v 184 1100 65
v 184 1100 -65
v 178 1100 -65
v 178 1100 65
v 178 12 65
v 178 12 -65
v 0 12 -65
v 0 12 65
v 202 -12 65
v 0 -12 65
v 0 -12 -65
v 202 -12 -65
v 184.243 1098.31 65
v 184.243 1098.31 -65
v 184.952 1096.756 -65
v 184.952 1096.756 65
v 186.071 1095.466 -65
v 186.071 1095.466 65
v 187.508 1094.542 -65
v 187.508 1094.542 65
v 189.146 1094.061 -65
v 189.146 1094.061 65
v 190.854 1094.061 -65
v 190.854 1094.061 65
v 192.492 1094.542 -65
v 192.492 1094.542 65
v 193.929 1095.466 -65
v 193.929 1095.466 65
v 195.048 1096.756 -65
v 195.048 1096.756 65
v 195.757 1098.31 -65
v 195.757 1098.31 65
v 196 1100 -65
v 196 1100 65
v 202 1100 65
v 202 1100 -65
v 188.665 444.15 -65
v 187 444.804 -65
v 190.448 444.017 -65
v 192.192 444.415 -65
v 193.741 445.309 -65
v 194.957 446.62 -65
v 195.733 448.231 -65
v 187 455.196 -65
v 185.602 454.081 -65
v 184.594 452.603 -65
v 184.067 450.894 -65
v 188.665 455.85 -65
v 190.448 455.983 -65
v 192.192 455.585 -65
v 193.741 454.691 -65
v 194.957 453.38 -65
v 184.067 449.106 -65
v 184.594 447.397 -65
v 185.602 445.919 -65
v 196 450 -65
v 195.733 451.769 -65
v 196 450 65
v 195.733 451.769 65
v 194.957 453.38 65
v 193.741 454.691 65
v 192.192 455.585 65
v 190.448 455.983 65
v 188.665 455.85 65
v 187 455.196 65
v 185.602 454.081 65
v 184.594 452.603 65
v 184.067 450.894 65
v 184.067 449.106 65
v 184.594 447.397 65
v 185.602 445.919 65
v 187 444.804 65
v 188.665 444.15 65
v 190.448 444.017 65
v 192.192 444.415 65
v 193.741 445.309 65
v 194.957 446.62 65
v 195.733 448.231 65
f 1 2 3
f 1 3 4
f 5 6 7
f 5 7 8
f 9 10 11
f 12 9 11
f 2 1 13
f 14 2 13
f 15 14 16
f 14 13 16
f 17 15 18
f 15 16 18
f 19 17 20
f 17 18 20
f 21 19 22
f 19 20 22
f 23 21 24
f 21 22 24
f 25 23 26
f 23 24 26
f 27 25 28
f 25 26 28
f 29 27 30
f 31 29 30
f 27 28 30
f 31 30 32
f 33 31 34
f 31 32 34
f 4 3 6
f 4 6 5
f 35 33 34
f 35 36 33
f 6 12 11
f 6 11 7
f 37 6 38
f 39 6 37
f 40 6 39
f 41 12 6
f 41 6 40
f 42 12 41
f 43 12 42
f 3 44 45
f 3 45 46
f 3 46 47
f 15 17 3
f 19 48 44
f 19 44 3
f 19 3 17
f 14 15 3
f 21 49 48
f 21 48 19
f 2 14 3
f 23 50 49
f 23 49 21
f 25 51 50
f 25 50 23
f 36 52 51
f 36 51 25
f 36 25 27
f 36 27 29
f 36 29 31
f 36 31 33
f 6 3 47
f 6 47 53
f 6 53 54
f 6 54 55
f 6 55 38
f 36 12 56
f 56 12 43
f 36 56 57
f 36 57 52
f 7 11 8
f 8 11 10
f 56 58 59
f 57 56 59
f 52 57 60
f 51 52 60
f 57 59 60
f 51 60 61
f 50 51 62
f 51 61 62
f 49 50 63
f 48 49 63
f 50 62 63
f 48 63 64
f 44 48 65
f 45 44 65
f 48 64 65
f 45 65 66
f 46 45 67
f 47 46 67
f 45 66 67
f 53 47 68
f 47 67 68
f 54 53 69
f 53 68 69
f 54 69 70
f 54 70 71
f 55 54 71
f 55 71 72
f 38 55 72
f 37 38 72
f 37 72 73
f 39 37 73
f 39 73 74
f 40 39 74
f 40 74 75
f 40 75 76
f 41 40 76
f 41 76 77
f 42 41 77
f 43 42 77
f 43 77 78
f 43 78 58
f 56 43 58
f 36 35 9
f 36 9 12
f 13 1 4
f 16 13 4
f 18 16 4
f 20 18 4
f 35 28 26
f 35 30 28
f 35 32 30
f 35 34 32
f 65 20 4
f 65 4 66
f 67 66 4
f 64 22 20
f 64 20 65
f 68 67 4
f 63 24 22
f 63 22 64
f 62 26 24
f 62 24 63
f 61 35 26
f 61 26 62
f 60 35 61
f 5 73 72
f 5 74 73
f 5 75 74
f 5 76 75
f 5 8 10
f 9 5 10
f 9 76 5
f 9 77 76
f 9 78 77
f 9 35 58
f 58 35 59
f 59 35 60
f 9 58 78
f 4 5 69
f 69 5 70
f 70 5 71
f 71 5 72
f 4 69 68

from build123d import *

# Parameters (mm, degrees)
SZKIC2_W                   = 130
SZKIC2_H                   = 24
SZKIC3_R                   = 6
WYTNIJ_WYCI_GNI_CIE1_DEPTH = 131


with BuildPart() as part:
    # Wyciągnięcie po ścieżce1: sweep along a path in Szkic1
    with BuildLine(Plane.XY) as wyci_gni_cie_po_cie_ce1_path:
        Line((0, 0), (190, 0))
        Line((190, 0), (190, 1100))
    # Szkic2 → Wyciągnięcie po ścieżce1 (sweep)
    with BuildSketch(Plane(origin=(0, 0, 0), x_dir=(0, 0, -1), z_dir=(1, 0, 0))):
        Rectangle(SZKIC2_W, SZKIC2_H)
    sweep(path=wyci_gni_cie_po_cie_ce1_path.line, transition=Transition.RIGHT)

    # Szkic3 → Wytnij-wyciągnięcie1 (cut, through all)
    with BuildSketch(Plane.XY.offset(65)):
        with Locations((190, 1100)):
            Circle(SZKIC3_R)
        with Locations((190, 450)):
            Circle(SZKIC3_R)
    extrude(amount=-WYTNIJ_WYCI_GNI_CIE1_DEPTH, mode=Mode.SUBTRACT)


solid = part.part
